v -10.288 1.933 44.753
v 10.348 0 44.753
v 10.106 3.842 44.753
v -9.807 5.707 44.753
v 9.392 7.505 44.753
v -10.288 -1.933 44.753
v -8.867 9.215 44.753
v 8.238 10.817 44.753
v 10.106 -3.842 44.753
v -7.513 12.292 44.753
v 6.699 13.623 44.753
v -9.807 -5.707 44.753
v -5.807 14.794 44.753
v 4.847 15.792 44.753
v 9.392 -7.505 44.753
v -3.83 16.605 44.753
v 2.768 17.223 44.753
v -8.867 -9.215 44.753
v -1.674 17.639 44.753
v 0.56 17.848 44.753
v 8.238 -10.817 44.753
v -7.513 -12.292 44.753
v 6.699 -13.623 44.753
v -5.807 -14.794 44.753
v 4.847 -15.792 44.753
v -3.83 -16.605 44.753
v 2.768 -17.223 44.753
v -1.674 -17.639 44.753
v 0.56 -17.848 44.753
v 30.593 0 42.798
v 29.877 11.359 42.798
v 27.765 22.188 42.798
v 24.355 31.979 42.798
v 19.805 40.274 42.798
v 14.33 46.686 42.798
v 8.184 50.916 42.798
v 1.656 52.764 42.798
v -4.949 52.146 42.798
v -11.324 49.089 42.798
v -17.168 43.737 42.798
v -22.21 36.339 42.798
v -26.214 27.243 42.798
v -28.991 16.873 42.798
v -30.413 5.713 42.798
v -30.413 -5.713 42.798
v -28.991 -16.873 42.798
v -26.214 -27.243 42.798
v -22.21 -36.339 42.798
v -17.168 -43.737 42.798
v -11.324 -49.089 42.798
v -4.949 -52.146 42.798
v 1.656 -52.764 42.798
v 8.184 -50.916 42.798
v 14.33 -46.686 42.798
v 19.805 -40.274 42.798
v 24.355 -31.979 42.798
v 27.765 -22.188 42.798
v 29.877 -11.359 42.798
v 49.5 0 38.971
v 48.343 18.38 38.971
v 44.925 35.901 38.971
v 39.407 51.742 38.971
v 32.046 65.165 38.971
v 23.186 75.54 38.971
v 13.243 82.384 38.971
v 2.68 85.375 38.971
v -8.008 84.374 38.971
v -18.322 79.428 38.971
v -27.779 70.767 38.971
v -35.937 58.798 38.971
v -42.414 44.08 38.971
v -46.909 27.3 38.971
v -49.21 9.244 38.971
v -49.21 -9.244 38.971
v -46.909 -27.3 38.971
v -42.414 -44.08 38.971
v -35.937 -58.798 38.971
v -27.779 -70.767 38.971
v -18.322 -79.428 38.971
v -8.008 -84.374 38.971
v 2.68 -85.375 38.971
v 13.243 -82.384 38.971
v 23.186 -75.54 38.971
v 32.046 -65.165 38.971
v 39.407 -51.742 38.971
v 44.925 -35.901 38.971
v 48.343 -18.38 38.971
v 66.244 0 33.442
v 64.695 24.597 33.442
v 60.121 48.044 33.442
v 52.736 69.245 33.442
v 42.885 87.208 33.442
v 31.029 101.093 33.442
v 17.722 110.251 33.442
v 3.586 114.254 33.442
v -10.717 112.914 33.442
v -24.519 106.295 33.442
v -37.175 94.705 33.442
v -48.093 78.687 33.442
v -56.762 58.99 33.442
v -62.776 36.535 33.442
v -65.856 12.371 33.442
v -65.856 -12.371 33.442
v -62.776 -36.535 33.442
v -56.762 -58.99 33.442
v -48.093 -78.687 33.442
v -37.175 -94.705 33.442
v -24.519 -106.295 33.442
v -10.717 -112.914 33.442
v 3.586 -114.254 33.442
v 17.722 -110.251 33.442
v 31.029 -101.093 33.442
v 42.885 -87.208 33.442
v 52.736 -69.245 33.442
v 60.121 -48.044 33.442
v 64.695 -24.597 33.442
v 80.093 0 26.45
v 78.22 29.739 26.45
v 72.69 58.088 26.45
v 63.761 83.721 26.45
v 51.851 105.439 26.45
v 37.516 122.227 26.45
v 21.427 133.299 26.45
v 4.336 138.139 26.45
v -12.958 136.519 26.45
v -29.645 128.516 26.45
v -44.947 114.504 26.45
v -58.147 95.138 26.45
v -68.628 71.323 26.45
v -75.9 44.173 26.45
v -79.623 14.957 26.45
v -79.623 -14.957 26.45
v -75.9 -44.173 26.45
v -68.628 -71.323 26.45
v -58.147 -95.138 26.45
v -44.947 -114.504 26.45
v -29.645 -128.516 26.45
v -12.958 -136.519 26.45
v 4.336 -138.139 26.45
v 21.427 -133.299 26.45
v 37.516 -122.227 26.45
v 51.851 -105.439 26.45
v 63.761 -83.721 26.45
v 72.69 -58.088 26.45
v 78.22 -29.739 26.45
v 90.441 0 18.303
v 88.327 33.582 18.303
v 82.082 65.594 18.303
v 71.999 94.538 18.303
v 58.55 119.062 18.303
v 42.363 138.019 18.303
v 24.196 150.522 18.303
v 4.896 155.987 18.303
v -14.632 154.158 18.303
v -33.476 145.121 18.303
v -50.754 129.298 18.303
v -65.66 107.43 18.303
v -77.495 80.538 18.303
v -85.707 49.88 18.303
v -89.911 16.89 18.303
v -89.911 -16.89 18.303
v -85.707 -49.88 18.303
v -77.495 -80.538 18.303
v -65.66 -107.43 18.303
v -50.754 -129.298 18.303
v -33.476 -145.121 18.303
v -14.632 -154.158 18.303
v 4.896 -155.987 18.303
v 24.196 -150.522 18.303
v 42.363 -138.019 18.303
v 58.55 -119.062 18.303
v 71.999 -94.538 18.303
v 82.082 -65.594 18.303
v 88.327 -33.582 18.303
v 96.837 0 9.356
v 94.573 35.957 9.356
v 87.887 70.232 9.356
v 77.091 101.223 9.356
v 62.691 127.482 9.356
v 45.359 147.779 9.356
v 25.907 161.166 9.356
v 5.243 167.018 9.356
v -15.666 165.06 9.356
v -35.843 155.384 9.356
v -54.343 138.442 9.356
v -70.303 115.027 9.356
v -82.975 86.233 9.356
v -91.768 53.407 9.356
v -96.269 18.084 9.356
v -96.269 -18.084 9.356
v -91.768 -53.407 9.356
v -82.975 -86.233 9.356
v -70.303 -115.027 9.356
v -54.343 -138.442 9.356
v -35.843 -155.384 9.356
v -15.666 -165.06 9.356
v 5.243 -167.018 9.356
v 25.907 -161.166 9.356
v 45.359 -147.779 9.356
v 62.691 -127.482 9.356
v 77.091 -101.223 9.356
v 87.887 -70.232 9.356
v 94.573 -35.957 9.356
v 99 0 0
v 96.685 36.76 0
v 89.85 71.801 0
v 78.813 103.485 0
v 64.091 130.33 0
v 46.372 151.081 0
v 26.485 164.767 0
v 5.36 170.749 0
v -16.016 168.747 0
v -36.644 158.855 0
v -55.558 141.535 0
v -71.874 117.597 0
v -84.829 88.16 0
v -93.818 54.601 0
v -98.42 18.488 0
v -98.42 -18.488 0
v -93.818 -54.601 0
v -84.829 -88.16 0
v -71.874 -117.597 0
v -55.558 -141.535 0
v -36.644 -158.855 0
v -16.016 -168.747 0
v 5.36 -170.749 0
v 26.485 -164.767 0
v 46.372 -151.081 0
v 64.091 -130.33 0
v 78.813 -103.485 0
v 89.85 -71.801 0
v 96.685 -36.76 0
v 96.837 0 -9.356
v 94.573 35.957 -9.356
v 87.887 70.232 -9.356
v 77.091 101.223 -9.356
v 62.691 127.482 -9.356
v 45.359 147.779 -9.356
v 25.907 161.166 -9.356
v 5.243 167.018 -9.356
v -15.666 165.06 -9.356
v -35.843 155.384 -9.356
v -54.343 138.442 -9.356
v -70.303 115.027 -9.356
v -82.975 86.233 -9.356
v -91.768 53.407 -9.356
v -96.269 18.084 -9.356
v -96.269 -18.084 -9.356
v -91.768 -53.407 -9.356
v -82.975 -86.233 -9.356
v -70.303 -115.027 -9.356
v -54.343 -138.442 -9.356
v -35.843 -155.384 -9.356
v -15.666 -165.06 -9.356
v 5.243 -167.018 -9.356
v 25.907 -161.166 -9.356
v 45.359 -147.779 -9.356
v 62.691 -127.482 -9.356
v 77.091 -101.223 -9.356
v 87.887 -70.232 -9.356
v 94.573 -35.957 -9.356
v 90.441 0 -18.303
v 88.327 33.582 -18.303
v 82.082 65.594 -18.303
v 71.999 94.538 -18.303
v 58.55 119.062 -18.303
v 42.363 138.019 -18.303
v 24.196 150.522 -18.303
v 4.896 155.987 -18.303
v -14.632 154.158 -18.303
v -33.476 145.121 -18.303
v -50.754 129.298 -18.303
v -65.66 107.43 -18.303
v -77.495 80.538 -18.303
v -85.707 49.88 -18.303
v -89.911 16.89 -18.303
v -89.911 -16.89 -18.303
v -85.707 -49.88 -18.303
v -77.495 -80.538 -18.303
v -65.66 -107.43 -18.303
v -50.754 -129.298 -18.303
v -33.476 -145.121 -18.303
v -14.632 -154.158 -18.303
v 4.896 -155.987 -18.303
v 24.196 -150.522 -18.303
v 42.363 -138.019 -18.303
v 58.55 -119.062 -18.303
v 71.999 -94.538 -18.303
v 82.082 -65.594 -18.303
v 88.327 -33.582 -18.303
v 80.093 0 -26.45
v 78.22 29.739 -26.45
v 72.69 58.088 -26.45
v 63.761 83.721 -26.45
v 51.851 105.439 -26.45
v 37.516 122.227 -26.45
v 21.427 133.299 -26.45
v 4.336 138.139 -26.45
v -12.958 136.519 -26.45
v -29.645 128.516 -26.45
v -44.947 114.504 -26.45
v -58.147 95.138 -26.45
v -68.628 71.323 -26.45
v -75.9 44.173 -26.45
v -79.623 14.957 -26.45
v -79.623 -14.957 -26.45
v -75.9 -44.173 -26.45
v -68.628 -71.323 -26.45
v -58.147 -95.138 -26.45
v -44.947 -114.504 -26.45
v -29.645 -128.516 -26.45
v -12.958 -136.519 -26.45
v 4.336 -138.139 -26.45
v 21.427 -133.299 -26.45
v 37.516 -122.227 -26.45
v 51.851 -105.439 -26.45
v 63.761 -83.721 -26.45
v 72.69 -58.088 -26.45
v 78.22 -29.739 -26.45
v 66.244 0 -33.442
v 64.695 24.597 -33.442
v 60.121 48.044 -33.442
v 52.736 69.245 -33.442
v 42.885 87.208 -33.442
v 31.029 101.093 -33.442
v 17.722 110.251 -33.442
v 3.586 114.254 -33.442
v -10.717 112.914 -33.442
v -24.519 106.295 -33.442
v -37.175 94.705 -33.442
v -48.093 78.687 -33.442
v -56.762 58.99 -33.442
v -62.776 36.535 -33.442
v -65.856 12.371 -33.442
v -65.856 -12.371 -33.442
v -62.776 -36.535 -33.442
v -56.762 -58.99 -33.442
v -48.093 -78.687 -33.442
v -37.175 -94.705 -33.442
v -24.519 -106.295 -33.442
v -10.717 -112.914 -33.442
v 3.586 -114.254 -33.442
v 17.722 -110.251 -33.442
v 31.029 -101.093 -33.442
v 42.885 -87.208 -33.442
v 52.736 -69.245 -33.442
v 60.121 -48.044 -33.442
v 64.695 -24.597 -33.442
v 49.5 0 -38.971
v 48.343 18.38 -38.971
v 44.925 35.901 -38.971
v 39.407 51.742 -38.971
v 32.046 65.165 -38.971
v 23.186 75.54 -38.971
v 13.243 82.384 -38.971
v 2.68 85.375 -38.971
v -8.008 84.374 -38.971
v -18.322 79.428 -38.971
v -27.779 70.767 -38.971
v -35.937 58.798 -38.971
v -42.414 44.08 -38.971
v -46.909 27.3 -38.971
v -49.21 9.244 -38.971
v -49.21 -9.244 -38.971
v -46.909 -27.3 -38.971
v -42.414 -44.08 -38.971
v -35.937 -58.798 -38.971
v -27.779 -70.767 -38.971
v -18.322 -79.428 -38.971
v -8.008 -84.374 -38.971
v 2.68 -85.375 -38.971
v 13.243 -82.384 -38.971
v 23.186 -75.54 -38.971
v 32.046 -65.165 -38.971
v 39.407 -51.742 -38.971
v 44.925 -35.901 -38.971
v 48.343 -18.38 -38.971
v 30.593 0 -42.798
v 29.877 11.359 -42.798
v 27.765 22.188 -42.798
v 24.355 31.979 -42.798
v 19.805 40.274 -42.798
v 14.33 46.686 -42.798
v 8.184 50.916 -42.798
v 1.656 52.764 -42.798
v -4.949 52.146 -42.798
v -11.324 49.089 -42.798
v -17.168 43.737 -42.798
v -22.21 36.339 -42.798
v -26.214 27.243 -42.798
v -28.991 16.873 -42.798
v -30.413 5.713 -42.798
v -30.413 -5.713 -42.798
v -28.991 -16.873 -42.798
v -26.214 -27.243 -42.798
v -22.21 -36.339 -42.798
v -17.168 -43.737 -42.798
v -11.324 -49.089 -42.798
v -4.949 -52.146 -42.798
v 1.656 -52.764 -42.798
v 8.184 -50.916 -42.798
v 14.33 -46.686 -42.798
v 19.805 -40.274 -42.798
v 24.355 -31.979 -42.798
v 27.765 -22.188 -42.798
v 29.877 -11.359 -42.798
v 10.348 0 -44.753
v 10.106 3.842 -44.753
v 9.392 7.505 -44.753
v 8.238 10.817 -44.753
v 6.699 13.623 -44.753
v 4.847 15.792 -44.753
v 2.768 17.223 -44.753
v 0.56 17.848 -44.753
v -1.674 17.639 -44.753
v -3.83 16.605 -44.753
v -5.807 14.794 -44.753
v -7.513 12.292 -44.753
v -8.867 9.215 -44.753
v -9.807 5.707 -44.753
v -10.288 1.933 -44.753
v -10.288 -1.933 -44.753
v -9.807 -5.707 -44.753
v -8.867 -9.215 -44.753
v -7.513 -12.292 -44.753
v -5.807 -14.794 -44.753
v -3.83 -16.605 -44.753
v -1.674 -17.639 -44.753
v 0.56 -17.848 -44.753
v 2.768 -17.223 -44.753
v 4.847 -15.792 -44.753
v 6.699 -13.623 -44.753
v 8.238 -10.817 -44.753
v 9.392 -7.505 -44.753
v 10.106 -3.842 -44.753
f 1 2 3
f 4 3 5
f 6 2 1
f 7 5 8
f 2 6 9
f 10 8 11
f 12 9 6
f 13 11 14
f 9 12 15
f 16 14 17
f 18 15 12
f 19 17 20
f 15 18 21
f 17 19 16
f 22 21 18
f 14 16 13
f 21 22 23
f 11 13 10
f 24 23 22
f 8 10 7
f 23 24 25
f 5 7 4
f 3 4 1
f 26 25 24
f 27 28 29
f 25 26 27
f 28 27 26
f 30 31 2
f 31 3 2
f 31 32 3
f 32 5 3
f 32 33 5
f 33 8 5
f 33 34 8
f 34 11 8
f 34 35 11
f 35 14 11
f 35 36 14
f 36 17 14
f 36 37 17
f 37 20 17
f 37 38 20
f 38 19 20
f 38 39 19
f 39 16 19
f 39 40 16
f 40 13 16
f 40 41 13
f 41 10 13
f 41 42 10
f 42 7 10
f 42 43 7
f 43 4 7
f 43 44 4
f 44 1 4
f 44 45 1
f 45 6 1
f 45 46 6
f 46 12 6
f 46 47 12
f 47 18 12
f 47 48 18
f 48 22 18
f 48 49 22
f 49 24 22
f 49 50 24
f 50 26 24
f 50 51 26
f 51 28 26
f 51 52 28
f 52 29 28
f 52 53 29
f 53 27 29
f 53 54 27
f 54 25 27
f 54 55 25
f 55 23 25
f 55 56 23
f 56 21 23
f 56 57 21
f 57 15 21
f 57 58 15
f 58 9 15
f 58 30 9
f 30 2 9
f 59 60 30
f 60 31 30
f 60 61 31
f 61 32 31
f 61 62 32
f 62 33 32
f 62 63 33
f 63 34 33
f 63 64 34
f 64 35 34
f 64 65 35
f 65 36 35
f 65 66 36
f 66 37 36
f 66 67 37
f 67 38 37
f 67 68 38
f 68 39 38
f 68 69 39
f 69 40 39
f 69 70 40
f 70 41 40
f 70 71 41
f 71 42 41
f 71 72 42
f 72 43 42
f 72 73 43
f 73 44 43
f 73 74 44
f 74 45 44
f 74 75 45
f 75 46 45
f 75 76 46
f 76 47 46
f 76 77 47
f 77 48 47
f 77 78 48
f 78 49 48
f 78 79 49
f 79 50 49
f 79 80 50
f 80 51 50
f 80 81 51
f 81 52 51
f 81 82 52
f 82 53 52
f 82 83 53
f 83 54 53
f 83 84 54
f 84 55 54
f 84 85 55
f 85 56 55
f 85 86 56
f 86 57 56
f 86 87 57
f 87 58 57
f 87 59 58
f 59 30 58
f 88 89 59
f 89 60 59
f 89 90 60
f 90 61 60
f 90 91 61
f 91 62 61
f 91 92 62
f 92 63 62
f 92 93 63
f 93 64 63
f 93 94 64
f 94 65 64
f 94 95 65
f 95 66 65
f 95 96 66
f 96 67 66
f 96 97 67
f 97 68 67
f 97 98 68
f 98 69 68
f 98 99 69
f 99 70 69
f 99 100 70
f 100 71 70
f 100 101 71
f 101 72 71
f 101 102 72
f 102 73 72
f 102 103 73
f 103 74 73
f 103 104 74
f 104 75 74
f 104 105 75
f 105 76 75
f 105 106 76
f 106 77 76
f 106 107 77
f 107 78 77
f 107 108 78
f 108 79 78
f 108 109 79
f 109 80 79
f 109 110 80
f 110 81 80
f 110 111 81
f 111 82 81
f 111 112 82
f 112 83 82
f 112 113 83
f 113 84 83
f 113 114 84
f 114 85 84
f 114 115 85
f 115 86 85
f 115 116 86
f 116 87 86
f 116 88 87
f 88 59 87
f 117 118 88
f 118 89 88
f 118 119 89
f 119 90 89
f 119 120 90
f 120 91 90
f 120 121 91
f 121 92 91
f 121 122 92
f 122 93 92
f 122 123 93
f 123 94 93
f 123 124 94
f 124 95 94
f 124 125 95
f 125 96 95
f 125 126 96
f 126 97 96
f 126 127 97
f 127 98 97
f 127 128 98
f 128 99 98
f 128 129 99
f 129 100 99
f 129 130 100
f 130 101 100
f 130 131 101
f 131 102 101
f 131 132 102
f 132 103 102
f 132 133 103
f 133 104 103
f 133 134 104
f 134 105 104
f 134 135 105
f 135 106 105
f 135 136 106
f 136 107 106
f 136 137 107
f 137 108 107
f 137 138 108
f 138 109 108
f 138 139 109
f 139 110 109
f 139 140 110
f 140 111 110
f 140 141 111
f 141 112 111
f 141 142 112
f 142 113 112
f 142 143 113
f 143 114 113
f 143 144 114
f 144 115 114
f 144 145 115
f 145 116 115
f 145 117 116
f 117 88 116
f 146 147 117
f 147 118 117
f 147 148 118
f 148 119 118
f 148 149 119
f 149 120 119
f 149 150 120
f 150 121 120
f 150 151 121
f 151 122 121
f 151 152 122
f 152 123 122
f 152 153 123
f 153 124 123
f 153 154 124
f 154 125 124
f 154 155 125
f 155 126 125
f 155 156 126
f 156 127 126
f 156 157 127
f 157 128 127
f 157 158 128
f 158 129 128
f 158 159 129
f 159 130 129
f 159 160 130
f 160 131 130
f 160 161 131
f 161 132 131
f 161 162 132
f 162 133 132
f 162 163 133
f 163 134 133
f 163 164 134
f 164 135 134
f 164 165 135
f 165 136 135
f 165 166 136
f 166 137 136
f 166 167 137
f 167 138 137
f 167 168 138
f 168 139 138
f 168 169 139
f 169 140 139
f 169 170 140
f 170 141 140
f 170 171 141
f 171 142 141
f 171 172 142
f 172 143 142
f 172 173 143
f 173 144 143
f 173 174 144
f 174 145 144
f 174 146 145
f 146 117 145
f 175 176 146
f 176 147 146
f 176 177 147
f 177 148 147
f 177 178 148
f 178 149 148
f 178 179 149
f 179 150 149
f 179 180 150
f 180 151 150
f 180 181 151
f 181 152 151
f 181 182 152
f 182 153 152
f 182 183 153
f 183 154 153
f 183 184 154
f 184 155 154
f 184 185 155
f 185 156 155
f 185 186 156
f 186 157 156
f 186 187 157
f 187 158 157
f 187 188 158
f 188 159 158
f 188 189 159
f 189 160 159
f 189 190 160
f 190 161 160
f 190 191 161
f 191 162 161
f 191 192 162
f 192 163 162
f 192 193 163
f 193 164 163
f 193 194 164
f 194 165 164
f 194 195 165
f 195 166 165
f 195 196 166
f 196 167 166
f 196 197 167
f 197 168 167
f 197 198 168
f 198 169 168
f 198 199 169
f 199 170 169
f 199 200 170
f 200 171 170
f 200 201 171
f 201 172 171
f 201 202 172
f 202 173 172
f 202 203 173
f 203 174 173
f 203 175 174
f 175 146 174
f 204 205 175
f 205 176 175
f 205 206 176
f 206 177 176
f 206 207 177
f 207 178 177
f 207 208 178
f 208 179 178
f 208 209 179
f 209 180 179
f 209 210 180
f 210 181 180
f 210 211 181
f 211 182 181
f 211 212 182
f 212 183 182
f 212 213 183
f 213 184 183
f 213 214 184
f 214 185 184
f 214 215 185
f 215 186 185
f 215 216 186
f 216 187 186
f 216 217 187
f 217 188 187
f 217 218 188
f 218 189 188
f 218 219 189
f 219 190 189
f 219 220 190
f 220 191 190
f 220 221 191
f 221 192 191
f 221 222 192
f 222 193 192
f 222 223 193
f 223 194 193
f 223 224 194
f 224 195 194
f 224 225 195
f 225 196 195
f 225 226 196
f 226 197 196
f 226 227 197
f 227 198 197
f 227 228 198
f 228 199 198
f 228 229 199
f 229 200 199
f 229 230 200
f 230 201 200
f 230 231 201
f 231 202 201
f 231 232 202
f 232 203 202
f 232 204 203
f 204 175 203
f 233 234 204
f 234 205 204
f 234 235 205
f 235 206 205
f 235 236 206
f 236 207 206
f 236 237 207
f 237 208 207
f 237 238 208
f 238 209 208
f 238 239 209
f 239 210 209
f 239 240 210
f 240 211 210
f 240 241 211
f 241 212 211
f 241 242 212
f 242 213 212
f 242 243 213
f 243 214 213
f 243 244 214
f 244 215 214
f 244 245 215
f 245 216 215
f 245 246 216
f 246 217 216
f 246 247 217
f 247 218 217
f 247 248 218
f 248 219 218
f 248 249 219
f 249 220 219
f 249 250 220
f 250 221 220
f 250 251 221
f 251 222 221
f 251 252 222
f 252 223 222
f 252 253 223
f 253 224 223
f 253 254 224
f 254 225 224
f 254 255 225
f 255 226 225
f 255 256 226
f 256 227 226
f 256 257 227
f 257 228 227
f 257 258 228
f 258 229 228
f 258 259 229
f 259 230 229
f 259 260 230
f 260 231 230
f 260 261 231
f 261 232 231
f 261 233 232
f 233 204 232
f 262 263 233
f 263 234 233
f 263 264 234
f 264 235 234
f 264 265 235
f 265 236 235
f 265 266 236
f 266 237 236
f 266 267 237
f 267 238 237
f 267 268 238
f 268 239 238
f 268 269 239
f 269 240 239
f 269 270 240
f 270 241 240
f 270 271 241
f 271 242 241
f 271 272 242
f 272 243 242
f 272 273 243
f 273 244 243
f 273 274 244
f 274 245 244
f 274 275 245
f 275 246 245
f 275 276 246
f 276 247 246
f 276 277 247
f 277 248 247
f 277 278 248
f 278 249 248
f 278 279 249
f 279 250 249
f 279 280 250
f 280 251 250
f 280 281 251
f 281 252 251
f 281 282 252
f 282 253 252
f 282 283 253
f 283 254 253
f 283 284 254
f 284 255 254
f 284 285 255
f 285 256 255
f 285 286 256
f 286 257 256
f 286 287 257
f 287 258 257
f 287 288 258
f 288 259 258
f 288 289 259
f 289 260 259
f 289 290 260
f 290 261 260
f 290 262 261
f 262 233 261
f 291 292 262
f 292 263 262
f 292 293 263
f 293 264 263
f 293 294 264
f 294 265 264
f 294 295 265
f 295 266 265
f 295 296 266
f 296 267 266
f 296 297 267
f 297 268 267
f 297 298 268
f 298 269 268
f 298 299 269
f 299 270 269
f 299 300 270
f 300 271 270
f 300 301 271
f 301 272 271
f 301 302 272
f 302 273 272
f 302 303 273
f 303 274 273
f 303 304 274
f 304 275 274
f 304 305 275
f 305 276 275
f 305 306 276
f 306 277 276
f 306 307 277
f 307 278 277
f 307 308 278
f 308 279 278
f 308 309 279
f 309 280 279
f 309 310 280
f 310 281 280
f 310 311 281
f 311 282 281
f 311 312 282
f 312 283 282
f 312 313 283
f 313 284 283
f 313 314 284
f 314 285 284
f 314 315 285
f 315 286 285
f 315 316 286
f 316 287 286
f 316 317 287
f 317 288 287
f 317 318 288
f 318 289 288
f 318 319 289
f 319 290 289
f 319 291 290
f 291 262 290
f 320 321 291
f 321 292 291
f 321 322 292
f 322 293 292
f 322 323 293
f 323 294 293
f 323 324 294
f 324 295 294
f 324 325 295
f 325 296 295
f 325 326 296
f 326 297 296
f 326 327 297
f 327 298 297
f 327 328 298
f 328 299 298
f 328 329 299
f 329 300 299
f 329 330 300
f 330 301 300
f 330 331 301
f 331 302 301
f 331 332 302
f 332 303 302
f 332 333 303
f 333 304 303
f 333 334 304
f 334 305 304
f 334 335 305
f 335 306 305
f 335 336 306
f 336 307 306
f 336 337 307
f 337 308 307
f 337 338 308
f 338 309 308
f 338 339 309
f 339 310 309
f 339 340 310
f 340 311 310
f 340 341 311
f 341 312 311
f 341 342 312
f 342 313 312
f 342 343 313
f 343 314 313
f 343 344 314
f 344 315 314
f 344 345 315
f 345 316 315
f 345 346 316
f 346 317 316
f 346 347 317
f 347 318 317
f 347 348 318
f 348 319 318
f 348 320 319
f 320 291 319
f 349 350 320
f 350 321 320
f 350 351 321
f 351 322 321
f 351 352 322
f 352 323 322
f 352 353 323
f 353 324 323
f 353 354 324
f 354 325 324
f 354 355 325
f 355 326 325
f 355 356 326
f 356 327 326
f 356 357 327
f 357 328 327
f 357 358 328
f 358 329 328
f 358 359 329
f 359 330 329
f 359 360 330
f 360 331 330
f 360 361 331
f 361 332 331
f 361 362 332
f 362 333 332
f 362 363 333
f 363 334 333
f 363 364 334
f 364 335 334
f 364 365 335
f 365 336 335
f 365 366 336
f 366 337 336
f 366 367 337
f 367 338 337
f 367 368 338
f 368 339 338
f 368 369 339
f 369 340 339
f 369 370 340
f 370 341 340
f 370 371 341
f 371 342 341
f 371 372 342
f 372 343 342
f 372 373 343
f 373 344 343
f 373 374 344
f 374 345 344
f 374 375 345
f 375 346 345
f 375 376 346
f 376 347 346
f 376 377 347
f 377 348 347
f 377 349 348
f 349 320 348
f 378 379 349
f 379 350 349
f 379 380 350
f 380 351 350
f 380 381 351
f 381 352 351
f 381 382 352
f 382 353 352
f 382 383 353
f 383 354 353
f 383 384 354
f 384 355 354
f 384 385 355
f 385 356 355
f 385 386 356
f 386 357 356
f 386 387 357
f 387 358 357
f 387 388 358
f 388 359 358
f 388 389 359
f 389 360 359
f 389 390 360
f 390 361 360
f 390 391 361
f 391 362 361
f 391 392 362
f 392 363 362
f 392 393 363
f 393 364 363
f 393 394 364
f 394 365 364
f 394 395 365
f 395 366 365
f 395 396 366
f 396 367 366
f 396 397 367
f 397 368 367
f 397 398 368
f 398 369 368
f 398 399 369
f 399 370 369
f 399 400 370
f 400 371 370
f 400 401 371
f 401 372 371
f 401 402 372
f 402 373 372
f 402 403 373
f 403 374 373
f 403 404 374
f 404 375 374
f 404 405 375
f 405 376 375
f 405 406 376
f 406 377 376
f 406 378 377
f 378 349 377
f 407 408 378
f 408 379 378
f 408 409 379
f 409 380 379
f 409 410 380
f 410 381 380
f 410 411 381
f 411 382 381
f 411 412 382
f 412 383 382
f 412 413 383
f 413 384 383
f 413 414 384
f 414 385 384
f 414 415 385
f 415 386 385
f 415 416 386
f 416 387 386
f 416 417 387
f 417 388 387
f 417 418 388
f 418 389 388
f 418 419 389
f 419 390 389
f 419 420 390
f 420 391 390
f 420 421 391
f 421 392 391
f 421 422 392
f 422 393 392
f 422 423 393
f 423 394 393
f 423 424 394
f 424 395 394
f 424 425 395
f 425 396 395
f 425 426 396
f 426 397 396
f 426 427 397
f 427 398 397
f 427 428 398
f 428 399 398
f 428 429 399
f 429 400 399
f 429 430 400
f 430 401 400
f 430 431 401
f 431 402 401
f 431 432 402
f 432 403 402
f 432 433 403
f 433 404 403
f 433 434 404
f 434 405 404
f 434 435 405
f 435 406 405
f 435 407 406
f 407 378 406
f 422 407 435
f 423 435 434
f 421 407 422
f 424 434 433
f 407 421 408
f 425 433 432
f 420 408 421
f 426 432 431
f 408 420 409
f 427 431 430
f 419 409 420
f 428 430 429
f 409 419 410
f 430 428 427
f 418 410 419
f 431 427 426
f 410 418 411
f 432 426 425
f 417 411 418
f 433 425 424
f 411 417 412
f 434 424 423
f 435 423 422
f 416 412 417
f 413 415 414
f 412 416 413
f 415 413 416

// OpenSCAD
// Generated by SolidPython 1.0.1 on 2020-07-29 00:46:50


scale(v = [11, 19, 5]) {
	sphere(r = 9);
}
/***********************************************
*********      SolidPython code:      **********
************************************************
 
# import packages: SolidPython
from solid import *
from solid.utils import *
from itertools import chain, combinations, permutations


class Resize:

    def __init__(self, scad_file):
        self.scad_file = scad_file
        #self.scad_file = import_scad(scad_file)
        # cone/cylinder param:
        self.r1 = 0
        self.r2 = 0
        self.h = 0
        # rectangular prism param:
        self.w = 0
        self.l = 0
        # ellipse param:
        self.r = 0

    # import OpenScad code (file name corresponds to shape)


    # classify shape + parameters
    def assign(self, param1, param2, param3):
        if self.scad_file == 'cone.scad':
            self.r1 = param1
            self.r2 = param2
            self.h = param3
        elif self.scad_file == 'cylinder.scad':
            self.r1 = param1
            self.r2 = param2
            self.h = param3
        elif self.scad_file == 'rectangularPrism.scad':
            self.h = param1
            self.l = param2
            self.w = param3
        else:
            self.r = param1
            self.h = param2

    # resize parameters
    def iterate(self):
        x = range(3, 20, 2)
        i = 1
        if self.scad_file == 'cone.scad':
            tempList = list(permutations(x, 2))
            for temp in tempList:
                param1 = temp[0]
                param2 = temp[1]
                filepath = 'produced_scad_files/' + 'cone' + str(param1) + '_' + str(param2) + '_' + '.scad'
                scad_render_to_file(cylinder(h=param1, r1=param2, r2=0), filepath)

        elif self.scad_file == 'cylinder.scad':
            tempList = list(permutations(x, 3))
            for temp in tempList:
                param1 = temp[0]
                param2 = temp[1]
                filepath = 'produced_scad_files/' + 'cylinder' + str(param1) + '_' + str(param2) + '_' + '.scad'
                scad_render_to_file(cylinder(h=param1, r1=param2, r2=param2), filepath)

        elif self.scad_file == 'rectangularPrism.scad':
            tempList = list(permutations(x, 3))
            for temp in tempList:
                param1 = temp[0]
                param2 = temp[1]
                param3 = temp[2]
                filepath = 'produced_scad_files/' + 'rectangularPrism' + str(param1) + '_' + str(param2) + '_' + str(
                    param3) + '.scad'
                scad_render_to_file(cube(size=(param1, param2, param3)), filepath)

        elif self.scad_file == 'ellipse.scad':
            tempList = list(permutations(x, 4))
            for temp in tempList:
                param1 = temp[0]
                param2 = temp[1]
                param3 = temp[2]
                param4 = temp[3]
                filepath = 'produced_scad_files/' + 'ellipse' + str(param1) + '_' + str(param2) + '_' + str(param3) + '_' + str(param4) + '.scad'
                scad_render_to_file(scale([param1, param2, param3])(sphere(r=param4)), filepath)

    def render_to_scadfile(self):
        scad_render_to_file(scad, 'example.scad') 
 
************************************************/
